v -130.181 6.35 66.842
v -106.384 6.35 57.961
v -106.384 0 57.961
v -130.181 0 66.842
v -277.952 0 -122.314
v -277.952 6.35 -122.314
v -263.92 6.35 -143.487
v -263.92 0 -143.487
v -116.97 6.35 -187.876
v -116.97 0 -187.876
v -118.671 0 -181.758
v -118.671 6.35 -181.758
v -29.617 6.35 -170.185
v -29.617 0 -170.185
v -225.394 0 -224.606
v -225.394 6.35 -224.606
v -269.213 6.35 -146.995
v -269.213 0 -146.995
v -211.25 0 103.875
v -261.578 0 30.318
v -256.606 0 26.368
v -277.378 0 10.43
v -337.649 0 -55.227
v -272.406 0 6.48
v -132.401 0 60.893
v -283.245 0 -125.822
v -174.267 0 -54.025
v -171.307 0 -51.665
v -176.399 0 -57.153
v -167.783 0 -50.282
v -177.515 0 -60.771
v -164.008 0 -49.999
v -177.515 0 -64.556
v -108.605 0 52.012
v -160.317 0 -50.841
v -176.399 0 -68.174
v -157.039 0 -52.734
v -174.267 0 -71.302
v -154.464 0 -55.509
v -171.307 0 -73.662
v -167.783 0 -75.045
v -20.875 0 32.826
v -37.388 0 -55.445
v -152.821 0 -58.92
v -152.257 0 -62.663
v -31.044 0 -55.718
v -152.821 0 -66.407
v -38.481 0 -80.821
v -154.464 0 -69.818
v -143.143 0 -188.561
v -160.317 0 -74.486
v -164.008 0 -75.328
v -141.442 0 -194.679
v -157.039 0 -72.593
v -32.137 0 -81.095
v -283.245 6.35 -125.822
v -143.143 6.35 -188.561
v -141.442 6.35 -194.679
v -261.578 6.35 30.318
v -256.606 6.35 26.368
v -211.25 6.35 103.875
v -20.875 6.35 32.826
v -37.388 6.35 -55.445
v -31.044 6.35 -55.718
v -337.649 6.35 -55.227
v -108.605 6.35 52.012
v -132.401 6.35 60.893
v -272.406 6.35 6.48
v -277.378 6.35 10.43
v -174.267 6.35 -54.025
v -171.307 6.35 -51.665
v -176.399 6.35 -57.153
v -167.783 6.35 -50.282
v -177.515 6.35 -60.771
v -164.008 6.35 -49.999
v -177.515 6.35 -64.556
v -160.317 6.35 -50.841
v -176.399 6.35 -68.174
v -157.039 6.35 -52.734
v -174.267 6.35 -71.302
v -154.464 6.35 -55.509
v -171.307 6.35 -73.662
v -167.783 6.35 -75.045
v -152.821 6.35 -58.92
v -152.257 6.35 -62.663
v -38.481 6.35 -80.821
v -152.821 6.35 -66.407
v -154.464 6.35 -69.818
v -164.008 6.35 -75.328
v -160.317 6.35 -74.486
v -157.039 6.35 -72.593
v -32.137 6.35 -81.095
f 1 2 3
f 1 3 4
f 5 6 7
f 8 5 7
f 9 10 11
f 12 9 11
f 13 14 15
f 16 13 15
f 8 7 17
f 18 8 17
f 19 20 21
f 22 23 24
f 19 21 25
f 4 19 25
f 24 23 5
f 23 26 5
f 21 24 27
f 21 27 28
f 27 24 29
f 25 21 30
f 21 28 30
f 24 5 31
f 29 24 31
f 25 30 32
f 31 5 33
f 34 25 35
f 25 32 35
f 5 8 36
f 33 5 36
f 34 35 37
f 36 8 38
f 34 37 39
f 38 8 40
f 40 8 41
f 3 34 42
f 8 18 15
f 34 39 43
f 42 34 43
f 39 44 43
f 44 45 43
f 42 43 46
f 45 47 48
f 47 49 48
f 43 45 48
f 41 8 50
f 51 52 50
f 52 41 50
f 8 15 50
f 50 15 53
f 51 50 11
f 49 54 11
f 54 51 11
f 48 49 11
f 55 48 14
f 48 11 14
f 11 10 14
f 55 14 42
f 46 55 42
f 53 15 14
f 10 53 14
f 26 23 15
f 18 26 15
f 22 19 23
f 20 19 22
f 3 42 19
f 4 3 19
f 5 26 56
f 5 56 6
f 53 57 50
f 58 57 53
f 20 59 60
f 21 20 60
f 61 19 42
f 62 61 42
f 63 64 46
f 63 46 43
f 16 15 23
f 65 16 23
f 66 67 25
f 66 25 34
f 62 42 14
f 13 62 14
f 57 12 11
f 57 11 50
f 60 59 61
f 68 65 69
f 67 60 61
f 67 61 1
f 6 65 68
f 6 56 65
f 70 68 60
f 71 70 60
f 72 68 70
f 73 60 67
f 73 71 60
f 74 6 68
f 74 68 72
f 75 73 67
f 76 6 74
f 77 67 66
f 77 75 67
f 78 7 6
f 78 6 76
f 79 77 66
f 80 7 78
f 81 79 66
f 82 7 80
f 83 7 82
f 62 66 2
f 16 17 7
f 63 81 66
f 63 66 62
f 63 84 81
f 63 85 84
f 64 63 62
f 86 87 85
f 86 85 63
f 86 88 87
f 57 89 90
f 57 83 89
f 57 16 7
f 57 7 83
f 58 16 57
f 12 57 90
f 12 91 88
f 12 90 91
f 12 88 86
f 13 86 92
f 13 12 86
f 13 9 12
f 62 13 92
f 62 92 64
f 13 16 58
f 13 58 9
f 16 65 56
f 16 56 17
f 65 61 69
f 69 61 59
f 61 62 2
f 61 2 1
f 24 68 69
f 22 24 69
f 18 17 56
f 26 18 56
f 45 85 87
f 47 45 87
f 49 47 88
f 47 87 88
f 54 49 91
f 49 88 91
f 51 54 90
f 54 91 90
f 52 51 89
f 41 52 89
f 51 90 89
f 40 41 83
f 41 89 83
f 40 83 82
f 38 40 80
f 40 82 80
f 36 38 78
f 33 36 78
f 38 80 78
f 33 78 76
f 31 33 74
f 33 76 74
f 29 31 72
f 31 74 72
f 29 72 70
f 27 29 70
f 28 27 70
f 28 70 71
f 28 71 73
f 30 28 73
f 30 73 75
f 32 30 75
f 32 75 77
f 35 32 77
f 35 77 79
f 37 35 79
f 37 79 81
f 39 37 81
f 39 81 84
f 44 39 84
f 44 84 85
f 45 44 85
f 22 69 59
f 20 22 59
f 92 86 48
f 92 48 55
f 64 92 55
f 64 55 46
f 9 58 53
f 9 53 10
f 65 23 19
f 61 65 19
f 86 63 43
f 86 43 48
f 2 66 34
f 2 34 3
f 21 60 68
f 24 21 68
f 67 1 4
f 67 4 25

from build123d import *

# Parameters (mm, degrees)
BOSS_EXTRUDE1_DEPTH = 6.35
CUT_EXTRUDE1_DEPTH  = 7.35
SKETCH3_R           = 12.7
CUT_EXTRUDE2_DEPTH  = 7.35


with BuildPart() as part:
    # Sketch1 → Boss-Extrude1 (new body)
    with BuildSketch(Plane(origin=(0, 0, 0), x_dir=(1, 0, 0), z_dir=(0, 1, 0))):
        Polygon((-20.875255467, -32.826433561), (-29.617127229, 170.18543722), (-225.394276758, 224.605541248), (-337.649337625, 55.227144427), (-211.249631122, -103.874565796), align=None)
    extrude(amount=BOSS_EXTRUDE1_DEPTH)

    # Sketch2 → Cut-Extrude1 (cut, through all)
    with BuildSketch(Plane(origin=(0, 6.35, 0), x_dir=(1, 0, 0), z_dir=(0, 1, 0))):
        Polygon((-132.401350038, -60.892609465), (-108.604553081, -52.011592936), (-106.384298948, -57.960792175), (-130.181095905, -66.841808704), align=None)
        Polygon((-277.377537586, -10.429862968), (-261.577574273, -30.317576745), (-256.605645828, -26.367585917), (-272.405609141, -6.479872139), align=None)
        Polygon((-283.244673595, 125.822222384), (-277.951598695, 122.314251732), (-263.919716086, 143.486551334), (-269.212790987, 146.994521986), align=None)
        Polygon((-141.44240209, 194.678709813), (-116.970258399, 187.876196809), (-118.67088665, 181.758160887), (-143.143030341, 188.56067389), align=None)
        Polygon((-38.480800257, 80.821376768), (-32.136679295, 81.094560261), (-31.043945325, 55.718076413), (-37.388066287, 55.444892921), align=None)
    extrude(amount=-CUT_EXTRUDE1_DEPTH, mode=Mode.SUBTRACT)

    # Sketch3 → Cut-Extrude2 (cut, through all)
    with BuildSketch(Plane(origin=(0, 6.35, 0), x_dir=(1, 0, 0), z_dir=(0, 1, 0))):
        with Locations((-164.95712564, 62.663424707)):
            Circle(SKETCH3_R)
    extrude(amount=-CUT_EXTRUDE2_DEPTH, mode=Mode.SUBTRACT)


solid = part.part
